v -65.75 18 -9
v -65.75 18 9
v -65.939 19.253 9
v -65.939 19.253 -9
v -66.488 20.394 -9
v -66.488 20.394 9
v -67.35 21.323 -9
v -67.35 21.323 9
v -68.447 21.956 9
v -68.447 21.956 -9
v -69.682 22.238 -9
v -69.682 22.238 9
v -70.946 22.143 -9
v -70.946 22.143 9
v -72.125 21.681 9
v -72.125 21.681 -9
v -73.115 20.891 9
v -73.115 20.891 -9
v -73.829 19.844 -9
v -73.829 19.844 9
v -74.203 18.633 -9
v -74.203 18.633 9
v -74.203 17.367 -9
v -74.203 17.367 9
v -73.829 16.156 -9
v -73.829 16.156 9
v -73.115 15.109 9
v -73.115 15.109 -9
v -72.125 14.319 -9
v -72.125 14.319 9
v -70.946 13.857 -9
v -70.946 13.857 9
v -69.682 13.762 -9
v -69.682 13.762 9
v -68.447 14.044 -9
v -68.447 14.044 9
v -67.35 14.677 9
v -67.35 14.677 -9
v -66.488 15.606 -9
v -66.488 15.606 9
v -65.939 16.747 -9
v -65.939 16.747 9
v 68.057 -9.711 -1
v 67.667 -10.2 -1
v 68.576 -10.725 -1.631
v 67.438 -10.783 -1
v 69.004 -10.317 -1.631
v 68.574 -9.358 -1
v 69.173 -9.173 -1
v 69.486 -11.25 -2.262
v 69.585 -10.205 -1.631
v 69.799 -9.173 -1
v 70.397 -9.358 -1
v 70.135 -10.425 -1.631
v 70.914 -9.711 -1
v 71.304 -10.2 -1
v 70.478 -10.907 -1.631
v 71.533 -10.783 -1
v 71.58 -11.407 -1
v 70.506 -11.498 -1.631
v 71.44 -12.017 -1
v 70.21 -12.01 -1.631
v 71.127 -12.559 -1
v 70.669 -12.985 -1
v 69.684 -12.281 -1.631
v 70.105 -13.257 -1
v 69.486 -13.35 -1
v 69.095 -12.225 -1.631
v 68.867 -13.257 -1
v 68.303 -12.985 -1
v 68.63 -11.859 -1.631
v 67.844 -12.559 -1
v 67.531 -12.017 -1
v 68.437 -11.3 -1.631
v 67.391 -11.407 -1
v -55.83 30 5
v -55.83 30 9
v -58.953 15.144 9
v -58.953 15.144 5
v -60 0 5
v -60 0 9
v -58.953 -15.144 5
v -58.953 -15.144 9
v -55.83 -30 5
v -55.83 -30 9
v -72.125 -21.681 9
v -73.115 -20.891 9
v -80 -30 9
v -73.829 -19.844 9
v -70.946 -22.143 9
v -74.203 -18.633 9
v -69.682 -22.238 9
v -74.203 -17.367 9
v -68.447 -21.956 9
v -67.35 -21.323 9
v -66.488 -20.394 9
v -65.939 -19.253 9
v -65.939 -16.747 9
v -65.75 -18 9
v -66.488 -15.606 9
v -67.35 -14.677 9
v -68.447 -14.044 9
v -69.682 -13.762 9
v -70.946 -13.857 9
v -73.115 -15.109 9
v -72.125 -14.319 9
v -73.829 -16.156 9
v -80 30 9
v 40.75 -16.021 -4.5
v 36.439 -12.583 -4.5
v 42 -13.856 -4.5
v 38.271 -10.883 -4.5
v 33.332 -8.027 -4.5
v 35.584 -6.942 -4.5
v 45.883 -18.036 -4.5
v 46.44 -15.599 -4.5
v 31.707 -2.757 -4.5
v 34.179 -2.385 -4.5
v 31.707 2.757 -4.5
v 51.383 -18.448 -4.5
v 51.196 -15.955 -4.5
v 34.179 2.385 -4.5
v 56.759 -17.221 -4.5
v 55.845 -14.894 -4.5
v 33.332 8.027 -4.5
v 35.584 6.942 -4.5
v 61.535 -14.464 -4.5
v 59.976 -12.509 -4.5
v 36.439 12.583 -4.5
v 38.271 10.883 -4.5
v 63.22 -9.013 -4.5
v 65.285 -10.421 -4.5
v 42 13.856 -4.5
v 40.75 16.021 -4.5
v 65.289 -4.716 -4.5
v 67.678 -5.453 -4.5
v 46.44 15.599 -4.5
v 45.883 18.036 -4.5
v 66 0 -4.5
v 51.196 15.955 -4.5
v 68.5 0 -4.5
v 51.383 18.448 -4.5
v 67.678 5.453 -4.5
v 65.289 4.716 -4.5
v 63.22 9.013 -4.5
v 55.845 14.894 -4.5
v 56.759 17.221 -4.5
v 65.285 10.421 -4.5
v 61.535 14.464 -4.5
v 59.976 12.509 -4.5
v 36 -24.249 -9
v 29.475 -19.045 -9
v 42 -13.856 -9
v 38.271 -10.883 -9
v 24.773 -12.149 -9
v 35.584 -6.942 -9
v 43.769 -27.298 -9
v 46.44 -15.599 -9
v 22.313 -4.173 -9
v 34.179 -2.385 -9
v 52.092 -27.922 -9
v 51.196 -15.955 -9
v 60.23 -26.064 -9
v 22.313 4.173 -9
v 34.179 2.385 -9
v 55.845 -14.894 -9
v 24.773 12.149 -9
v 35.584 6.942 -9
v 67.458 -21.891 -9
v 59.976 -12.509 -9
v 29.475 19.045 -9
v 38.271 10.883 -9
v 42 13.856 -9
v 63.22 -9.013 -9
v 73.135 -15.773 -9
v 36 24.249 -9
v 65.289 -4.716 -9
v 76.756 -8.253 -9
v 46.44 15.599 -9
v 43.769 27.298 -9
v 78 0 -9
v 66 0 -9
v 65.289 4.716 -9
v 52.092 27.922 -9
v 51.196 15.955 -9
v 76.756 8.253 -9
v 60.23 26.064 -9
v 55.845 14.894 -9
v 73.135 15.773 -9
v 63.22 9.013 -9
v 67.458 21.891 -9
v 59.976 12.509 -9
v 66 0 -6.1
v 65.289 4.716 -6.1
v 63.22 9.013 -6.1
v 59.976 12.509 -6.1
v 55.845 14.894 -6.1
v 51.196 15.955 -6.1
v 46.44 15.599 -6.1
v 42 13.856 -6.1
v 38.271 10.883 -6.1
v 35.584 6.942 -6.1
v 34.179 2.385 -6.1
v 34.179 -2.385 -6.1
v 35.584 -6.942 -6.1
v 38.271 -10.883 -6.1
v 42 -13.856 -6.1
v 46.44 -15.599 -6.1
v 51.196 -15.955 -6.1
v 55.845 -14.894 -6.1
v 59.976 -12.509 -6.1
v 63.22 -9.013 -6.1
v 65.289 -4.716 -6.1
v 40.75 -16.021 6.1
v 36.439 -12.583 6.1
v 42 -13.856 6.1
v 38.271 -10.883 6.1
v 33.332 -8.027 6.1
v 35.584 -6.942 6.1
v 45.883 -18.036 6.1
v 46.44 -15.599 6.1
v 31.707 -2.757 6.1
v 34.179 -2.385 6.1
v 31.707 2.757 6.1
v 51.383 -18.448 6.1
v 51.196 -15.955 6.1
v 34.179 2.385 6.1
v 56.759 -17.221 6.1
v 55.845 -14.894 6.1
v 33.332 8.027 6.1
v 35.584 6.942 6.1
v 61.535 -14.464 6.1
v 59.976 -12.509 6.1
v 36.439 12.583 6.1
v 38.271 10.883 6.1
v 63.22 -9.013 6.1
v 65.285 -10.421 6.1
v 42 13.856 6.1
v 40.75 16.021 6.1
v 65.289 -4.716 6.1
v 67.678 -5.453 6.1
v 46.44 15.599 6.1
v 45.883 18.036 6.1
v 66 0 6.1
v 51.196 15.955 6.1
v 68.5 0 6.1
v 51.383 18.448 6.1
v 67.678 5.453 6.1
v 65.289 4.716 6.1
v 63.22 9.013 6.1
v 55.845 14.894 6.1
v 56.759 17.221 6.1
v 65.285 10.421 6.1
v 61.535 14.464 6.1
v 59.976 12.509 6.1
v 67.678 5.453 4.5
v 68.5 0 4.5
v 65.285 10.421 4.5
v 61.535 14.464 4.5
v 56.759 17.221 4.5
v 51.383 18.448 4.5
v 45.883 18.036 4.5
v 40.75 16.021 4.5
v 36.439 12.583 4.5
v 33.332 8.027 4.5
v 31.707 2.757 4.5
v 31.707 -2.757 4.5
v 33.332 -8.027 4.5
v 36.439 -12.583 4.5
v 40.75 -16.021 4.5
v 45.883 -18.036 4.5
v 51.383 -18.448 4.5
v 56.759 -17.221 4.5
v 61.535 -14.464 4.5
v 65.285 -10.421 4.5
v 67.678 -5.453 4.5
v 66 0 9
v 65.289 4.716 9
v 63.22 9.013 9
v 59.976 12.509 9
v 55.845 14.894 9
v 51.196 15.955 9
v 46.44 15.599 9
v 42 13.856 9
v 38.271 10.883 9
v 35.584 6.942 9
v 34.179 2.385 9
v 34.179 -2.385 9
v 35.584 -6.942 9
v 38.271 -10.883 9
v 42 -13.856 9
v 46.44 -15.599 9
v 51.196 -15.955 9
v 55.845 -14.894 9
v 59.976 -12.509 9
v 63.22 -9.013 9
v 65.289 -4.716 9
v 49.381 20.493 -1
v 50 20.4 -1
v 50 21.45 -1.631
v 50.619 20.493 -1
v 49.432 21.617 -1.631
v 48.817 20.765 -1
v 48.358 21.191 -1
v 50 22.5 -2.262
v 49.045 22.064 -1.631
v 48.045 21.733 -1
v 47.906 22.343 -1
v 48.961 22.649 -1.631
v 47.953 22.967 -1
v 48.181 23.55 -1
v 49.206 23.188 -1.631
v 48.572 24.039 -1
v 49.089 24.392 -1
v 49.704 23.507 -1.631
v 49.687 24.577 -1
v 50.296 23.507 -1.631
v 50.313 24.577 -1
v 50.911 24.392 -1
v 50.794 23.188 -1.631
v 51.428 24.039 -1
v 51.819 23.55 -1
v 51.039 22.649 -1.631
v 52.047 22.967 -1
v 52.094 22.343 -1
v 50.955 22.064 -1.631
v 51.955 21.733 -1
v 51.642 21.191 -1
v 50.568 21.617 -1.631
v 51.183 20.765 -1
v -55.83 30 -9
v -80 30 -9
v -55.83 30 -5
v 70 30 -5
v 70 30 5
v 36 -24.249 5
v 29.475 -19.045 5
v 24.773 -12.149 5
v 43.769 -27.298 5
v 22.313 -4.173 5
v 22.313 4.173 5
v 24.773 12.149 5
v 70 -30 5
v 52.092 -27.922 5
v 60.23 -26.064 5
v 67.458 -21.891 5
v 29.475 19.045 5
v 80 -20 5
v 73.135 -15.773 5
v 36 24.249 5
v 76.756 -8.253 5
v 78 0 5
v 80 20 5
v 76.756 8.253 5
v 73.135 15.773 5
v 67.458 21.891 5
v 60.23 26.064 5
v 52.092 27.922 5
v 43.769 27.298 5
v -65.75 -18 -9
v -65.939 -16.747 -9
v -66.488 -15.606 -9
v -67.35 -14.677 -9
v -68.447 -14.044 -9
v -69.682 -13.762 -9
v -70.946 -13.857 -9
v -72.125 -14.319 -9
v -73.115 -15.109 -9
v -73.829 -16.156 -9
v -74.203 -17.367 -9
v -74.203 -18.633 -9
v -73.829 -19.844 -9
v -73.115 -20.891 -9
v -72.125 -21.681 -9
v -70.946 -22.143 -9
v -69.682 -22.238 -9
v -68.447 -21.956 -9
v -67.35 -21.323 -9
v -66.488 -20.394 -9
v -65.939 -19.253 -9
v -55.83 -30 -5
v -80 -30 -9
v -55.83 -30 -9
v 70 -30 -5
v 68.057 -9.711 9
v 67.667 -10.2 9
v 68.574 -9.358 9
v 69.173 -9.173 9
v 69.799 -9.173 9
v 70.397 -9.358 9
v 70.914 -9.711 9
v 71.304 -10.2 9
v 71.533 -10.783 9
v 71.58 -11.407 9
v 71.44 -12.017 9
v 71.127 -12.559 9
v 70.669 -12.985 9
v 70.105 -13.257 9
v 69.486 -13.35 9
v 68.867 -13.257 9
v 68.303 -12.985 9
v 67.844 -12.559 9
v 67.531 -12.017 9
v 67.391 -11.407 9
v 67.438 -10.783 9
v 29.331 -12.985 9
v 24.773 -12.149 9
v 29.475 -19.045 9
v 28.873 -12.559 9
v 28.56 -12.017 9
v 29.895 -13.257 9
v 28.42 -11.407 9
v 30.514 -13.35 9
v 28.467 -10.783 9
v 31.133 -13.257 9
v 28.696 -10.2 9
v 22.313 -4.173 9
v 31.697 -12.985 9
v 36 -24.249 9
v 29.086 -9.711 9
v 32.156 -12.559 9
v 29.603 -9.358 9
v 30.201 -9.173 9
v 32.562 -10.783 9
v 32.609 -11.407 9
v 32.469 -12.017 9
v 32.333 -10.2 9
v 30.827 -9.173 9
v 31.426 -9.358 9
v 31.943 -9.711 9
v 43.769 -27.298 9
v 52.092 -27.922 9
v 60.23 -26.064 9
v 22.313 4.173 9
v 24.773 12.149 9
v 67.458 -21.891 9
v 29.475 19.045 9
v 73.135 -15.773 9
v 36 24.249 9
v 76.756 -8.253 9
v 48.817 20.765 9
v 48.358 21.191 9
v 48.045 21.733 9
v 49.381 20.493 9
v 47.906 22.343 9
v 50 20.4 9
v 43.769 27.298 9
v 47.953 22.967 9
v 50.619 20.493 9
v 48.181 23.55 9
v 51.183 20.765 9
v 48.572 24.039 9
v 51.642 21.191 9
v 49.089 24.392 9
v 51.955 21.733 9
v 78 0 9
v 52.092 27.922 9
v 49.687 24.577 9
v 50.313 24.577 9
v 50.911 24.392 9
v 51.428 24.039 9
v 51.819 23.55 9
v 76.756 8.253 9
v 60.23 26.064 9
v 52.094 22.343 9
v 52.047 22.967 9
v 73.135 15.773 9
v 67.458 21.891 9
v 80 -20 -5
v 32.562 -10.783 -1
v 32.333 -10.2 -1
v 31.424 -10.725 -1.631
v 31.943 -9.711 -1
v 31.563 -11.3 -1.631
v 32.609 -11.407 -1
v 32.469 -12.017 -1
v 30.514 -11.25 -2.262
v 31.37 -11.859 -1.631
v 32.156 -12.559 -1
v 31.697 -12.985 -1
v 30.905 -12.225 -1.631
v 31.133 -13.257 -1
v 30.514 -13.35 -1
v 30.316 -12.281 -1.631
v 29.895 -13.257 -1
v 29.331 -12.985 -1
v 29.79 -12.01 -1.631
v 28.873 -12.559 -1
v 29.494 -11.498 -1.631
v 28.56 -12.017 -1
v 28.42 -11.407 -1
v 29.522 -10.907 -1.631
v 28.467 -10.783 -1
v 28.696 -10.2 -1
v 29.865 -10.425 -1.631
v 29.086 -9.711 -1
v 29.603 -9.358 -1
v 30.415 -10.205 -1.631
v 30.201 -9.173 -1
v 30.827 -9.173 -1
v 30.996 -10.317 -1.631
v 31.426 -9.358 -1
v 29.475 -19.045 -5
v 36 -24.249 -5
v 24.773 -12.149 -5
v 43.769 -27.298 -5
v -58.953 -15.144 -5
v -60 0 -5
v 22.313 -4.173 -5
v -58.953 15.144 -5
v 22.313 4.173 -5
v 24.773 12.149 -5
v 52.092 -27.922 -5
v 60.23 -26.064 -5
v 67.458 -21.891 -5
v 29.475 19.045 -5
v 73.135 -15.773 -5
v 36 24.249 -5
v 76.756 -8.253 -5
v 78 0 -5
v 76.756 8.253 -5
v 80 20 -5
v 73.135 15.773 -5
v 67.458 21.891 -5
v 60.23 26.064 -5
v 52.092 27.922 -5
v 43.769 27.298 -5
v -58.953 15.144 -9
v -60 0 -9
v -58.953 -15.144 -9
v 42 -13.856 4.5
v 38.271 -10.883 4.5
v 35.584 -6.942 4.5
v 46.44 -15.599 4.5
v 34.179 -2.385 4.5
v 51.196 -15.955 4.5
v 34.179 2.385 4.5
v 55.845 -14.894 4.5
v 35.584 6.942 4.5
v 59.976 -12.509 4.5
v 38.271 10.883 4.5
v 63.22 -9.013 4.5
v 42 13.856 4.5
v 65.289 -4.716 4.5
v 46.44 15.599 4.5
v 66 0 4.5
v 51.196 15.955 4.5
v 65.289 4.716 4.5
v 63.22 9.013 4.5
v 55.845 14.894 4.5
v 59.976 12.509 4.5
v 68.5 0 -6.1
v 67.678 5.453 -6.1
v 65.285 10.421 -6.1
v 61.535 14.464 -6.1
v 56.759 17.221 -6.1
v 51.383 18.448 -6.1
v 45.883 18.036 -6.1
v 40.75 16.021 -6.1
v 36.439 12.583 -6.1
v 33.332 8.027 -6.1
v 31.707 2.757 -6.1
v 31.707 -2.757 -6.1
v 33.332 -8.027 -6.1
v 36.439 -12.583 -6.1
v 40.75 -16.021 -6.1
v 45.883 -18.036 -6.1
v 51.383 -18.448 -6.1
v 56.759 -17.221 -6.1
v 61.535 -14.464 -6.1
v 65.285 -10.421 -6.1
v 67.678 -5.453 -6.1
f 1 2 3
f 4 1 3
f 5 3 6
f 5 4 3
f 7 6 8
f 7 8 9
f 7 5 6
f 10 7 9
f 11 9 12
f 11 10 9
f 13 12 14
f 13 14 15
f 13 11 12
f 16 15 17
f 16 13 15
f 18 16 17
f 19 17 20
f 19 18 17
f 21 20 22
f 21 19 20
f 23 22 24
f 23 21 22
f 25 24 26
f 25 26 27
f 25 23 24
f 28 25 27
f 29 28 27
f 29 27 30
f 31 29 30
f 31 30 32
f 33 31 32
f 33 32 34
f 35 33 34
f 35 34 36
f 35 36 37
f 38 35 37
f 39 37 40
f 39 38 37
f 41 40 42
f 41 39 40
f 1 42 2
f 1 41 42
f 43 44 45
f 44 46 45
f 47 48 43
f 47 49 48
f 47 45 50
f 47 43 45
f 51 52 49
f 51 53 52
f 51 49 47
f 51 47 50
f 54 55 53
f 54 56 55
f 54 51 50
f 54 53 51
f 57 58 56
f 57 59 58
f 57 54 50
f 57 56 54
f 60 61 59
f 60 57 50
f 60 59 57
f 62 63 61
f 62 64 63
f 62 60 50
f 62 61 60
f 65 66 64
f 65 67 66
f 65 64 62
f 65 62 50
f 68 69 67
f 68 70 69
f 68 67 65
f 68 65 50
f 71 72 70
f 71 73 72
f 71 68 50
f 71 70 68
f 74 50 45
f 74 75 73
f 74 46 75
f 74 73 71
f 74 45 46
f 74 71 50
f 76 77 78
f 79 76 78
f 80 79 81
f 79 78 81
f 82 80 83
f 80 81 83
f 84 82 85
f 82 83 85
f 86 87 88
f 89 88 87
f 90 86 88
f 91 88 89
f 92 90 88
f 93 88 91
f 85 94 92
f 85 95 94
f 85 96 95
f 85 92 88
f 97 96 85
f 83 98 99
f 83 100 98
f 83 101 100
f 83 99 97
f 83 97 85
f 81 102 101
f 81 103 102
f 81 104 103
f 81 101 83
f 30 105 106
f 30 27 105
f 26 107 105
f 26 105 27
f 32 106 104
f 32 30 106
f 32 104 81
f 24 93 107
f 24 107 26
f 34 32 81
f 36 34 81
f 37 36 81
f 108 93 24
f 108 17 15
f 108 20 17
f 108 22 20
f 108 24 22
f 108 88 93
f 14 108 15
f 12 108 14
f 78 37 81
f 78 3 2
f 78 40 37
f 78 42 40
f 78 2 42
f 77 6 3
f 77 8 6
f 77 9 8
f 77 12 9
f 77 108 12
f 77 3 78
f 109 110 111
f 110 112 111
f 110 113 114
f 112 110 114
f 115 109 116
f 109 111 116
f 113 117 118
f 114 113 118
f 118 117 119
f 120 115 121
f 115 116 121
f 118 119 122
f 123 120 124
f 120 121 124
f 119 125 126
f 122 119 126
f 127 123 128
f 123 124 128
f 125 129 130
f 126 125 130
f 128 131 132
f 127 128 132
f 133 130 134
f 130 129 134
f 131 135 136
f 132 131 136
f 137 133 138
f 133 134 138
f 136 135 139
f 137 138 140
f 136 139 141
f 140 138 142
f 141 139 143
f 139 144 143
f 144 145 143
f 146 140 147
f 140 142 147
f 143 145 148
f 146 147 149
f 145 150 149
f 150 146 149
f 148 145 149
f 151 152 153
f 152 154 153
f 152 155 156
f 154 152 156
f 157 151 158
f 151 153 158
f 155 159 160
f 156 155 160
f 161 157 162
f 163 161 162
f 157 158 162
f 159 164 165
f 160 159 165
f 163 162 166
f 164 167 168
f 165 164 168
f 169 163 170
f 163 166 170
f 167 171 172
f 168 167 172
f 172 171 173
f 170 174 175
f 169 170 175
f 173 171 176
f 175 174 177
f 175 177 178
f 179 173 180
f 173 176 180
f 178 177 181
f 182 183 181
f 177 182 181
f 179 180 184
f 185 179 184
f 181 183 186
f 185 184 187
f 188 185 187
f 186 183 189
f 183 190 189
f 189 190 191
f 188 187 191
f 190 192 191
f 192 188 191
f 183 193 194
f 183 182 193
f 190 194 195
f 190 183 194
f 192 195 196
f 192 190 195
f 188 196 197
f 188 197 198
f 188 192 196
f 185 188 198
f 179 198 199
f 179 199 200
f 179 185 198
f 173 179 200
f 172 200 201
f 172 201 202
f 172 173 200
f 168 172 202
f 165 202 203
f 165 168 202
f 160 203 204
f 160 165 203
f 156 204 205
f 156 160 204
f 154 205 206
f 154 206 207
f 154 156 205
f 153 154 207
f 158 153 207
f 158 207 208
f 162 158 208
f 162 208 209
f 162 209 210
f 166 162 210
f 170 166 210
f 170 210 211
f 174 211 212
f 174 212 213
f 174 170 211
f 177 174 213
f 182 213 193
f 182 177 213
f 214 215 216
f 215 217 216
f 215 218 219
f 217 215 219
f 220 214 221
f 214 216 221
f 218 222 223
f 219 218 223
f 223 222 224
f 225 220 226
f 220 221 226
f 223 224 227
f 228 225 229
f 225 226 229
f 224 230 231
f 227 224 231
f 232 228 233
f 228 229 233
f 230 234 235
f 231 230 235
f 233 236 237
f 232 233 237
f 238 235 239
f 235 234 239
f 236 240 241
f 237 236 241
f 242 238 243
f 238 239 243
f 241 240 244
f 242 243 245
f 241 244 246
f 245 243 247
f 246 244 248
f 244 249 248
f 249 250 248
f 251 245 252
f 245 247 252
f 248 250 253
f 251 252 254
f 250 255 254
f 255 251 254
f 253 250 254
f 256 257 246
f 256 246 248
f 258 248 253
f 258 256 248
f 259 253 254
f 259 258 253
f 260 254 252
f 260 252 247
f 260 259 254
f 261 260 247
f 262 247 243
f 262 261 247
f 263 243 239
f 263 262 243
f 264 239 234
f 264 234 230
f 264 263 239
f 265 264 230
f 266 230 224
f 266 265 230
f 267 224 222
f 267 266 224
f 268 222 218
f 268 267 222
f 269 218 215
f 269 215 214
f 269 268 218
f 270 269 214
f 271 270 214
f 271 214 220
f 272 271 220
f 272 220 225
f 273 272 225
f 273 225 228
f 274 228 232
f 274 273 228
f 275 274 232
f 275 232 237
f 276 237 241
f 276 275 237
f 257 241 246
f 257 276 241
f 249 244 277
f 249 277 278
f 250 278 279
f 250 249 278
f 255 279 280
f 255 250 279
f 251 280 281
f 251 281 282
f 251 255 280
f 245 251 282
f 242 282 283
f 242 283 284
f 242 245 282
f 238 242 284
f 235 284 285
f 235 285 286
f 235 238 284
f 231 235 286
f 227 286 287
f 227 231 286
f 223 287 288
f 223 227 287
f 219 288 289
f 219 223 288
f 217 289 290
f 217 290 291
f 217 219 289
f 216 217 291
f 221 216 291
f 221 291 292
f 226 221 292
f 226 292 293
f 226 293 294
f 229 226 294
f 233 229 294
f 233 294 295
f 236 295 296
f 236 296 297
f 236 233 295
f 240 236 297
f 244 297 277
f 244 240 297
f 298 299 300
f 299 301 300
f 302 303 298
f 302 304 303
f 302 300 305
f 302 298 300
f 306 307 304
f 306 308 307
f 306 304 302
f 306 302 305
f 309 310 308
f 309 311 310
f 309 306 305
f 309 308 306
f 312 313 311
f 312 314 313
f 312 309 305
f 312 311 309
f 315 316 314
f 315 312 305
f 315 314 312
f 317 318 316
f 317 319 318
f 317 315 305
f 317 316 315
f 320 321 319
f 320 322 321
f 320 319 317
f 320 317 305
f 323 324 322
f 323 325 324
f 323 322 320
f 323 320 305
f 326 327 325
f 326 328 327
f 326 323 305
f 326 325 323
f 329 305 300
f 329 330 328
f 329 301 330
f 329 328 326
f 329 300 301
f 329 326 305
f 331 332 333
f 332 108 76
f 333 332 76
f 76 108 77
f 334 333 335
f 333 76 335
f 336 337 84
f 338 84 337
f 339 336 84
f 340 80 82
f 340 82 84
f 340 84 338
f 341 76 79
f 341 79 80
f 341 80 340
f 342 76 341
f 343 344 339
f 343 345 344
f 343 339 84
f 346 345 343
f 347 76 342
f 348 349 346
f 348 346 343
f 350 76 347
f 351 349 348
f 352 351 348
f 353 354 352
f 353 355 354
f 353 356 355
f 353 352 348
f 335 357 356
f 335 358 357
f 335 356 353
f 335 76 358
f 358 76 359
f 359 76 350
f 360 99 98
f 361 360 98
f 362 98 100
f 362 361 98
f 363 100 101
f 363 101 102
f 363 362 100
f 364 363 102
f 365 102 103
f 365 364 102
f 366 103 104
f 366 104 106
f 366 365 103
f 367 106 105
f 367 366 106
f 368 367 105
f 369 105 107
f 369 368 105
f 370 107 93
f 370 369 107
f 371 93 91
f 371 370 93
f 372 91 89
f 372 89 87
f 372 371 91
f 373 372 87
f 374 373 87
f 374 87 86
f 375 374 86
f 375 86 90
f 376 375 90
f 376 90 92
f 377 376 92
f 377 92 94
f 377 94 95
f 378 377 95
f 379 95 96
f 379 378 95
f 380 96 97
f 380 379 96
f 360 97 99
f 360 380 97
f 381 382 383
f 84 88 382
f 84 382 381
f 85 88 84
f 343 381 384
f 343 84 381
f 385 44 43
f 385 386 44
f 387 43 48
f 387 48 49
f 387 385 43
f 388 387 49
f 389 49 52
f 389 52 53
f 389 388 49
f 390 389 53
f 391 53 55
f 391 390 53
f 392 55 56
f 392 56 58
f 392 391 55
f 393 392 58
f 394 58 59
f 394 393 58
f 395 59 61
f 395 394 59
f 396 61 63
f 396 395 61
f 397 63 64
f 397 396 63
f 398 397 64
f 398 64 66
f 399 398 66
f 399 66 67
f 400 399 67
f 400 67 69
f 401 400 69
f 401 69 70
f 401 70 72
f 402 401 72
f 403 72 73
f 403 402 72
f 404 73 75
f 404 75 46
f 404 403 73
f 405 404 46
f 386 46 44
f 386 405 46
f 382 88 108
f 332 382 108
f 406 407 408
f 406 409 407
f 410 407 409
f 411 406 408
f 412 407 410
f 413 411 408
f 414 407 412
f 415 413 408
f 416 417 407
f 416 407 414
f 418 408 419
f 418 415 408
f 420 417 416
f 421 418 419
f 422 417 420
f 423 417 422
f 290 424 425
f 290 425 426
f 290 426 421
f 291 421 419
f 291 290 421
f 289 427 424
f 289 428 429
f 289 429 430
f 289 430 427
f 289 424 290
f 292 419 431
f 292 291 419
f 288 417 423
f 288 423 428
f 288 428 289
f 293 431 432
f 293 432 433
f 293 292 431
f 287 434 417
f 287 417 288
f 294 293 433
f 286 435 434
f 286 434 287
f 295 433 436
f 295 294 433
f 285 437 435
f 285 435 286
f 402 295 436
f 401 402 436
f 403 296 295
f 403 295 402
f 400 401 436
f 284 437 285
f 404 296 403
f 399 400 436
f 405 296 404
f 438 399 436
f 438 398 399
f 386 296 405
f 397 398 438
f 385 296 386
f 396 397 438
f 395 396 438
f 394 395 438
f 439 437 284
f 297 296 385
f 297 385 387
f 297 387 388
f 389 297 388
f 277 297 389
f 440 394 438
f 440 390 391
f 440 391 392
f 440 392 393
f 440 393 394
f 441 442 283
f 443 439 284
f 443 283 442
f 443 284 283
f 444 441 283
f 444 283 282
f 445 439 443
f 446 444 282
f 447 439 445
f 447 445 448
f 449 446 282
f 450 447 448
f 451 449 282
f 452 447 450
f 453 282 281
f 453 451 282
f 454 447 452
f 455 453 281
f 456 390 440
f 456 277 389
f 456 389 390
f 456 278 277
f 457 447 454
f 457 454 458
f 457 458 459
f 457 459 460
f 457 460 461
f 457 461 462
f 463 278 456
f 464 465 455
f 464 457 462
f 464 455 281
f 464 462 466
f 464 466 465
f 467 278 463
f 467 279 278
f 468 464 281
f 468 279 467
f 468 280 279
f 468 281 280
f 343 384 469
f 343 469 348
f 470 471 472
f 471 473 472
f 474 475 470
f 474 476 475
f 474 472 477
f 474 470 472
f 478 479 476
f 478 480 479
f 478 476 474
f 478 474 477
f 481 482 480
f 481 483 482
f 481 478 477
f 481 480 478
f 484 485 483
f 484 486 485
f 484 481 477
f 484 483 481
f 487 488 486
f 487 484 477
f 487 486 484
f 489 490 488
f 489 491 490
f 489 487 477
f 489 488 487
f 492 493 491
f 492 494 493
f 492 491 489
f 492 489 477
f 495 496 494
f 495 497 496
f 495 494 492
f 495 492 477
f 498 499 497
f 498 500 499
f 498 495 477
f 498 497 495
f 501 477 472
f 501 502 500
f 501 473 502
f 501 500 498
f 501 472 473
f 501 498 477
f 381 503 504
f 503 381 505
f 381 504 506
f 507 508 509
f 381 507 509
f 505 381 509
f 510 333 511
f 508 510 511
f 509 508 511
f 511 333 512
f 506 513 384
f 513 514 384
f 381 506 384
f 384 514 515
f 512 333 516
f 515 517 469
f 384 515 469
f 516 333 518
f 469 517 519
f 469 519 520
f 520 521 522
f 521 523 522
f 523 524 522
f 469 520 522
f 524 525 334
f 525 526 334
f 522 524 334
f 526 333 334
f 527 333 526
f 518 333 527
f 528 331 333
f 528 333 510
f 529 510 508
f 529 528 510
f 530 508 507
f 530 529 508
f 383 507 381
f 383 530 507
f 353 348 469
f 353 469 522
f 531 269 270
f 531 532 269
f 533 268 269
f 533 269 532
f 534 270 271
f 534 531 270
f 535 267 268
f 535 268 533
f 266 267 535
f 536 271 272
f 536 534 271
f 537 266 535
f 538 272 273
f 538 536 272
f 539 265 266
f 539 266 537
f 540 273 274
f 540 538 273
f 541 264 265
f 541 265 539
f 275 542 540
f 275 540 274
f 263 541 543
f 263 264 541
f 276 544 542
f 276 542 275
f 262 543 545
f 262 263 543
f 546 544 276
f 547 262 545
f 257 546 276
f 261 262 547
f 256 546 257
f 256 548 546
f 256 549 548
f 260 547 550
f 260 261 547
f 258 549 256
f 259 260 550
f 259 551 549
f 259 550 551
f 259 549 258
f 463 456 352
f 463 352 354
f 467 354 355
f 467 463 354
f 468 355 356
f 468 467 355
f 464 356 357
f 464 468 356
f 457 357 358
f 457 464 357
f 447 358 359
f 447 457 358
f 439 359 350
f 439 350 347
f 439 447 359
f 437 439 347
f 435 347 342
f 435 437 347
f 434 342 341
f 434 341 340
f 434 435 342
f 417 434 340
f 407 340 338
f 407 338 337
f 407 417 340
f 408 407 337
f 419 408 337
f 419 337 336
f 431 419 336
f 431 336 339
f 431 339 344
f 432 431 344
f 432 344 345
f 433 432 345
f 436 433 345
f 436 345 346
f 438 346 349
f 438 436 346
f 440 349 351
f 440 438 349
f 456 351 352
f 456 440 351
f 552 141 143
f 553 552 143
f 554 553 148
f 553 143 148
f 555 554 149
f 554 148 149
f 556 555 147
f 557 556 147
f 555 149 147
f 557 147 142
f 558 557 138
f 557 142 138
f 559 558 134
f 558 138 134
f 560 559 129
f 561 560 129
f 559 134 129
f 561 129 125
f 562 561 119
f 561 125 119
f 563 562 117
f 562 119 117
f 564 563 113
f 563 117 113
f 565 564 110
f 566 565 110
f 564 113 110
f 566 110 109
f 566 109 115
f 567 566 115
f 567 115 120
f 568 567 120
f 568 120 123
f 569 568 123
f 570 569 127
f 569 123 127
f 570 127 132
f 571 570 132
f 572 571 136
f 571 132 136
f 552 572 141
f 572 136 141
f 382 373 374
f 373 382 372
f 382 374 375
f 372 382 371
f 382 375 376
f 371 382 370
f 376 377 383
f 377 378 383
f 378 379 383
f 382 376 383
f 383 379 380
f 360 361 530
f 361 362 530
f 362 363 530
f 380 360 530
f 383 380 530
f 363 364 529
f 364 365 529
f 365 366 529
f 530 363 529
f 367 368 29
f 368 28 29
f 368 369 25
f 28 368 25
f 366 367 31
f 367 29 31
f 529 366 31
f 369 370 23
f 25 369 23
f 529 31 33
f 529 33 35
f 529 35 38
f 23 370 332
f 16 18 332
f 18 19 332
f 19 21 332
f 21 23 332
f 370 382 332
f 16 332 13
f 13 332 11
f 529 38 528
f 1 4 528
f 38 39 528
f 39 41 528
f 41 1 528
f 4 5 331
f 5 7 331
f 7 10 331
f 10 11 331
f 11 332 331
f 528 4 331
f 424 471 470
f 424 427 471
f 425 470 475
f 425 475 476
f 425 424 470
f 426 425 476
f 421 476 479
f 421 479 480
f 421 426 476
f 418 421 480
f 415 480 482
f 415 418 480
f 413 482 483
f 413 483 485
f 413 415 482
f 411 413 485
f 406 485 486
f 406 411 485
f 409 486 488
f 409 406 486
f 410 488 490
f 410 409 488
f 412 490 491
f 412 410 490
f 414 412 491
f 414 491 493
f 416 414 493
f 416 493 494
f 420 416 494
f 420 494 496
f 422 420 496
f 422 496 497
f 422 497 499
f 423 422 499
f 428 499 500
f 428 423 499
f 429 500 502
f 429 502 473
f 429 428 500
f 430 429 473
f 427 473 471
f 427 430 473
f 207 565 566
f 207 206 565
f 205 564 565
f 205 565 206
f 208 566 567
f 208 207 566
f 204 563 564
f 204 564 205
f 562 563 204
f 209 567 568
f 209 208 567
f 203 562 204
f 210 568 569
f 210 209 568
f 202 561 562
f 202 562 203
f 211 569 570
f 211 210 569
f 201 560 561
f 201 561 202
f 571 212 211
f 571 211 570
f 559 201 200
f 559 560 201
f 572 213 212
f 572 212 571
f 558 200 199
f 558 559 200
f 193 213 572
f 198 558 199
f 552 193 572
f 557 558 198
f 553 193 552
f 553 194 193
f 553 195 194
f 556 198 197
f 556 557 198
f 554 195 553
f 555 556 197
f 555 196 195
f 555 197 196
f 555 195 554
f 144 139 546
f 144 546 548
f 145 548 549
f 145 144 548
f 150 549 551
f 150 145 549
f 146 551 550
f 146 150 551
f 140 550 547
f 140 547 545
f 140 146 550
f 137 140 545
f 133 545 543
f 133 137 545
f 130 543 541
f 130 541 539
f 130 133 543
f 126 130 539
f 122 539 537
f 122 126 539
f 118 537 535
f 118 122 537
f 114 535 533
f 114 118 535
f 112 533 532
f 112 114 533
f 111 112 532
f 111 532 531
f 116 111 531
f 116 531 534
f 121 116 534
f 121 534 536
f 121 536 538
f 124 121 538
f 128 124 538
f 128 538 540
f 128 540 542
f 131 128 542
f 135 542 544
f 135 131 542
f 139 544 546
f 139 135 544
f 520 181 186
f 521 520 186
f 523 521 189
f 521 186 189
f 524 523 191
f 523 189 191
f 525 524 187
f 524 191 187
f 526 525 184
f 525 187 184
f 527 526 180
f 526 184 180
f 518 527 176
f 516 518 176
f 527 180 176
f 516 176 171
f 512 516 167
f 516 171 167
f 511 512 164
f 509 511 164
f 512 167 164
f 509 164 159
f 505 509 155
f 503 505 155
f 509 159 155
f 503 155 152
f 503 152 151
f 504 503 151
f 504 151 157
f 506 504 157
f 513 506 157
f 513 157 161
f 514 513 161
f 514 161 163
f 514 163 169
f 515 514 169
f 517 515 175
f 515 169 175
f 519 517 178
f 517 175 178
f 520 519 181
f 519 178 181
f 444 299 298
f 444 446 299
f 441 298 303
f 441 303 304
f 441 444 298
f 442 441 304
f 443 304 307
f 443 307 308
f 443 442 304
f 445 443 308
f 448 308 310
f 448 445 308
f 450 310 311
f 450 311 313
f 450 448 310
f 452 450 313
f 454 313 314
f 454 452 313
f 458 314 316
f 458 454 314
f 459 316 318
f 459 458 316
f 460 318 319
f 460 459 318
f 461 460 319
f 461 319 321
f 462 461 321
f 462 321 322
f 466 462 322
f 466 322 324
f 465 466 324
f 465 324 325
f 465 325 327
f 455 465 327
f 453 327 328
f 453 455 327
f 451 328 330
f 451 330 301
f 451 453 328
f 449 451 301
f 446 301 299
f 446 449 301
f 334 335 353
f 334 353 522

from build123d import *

# Parameters (mm, degrees)
SKETCH1_W           = 160
SKETCH1_H           = 60
SKETCH1_R           = 4.25
SKETCH1_R_2         = 16
BOSS_EXTRUDE1_DEPTH = 9
CIRPATTERN2_COUNT   = 3
CHAMFER1_SIZE       = 10
SKETCH5_R           = 18.5
SKETCH5_R_2         = 16
CUT_EXTRUDE2_DEPTH  = 1.6
SKETCH4_R           = 28
CUT_EXTRUDE1_DEPTH  = 4


with BuildPart() as part:
    # Sketch1 → Boss-Extrude1 (new body, symmetric)
    with BuildSketch(Plane.XY):
        Rectangle(SKETCH1_W, SKETCH1_H)
        with Locations((-70, 18)):
            Circle(SKETCH1_R, mode=Mode.SUBTRACT)
        with Locations((-70, -18)):
            Circle(SKETCH1_R, mode=Mode.SUBTRACT)
        with Locations((50, 0)):
            Circle(SKETCH1_R_2, mode=Mode.SUBTRACT)
    extrude(amount=BOSS_EXTRUDE1_DEPTH, both=True)

    # Sketch3 → M5 Tapped Hole1 (revolve, cut)
    with BuildSketch(Plane(origin=(50, 22.5, 9), x_dir=(0, -1, 0), z_dir=(1, 0, 0))):
        Polygon((0, 0), (0, 11.2618073), (2.1, 10), (2.1, 0), align=None)
    m5_tapped_hole1 = revolve(axis=Axis((50, 22.5, 15.35), (0, 0, -1)), mode=Mode.SUBTRACT)

    # CirPattern2: M5 Tapped Hole1 ×3 about axis
    cirpattern2_axis = Axis((50, 0, 0), (0, 0, 1))
    for i in range(1, CIRPATTERN2_COUNT):
        add(m5_tapped_hole1.rotate(cirpattern2_axis, i * 360 / CIRPATTERN2_COUNT), mode=Mode.SUBTRACT)

    # Chamfer1
    chamfer1_edges = [part.edges().sort_by_distance(p)[0] for p in [
        (80, 30, 0),
        (80, -30, 0),
    ]]
    chamfer(chamfer1_edges, length=CHAMFER1_SIZE)

    # Sketch5 → Cut-Extrude2 (cut)
    with BuildSketch(Plane.XY.offset(4.5)):
        with Locations((50, 0)):
            Circle(SKETCH5_R)
        with Locations((50, 0)):
            Circle(SKETCH5_R_2, mode=Mode.SUBTRACT)
    cut_extrude2 = extrude(amount=CUT_EXTRUDE2_DEPTH, mode=Mode.SUBTRACT)

    # Mirror2: Cut-Extrude2 across plane
    add(cut_extrude2.mirror(Plane.XY), mode=Mode.SUBTRACT)

    # Sketch4 → Cut-Extrude1 (cut)
    with BuildSketch(Plane.XY.offset(9)):
        with BuildLine():
            ThreePointArc((-55.830052443, 30), (-60, 0), (-55.830052443, -30))
            Line((-55.830052443, -30), (70, -30))
            Line((70, -30), (80, -20))
            Line((80, -20), (80, 20))
            Line((80, 20), (70, 30))
            Line((70, 30), (-55.830052443, 30))
        make_face()
        with Locations((50, 0)):
            Circle(SKETCH4_R, mode=Mode.SUBTRACT)
    cut_extrude1 = extrude(amount=-CUT_EXTRUDE1_DEPTH, mode=Mode.SUBTRACT)

    # Mirror1: Cut-Extrude1 across plane
    add(cut_extrude1.mirror(Plane.XY), mode=Mode.SUBTRACT)


solid = part.part
